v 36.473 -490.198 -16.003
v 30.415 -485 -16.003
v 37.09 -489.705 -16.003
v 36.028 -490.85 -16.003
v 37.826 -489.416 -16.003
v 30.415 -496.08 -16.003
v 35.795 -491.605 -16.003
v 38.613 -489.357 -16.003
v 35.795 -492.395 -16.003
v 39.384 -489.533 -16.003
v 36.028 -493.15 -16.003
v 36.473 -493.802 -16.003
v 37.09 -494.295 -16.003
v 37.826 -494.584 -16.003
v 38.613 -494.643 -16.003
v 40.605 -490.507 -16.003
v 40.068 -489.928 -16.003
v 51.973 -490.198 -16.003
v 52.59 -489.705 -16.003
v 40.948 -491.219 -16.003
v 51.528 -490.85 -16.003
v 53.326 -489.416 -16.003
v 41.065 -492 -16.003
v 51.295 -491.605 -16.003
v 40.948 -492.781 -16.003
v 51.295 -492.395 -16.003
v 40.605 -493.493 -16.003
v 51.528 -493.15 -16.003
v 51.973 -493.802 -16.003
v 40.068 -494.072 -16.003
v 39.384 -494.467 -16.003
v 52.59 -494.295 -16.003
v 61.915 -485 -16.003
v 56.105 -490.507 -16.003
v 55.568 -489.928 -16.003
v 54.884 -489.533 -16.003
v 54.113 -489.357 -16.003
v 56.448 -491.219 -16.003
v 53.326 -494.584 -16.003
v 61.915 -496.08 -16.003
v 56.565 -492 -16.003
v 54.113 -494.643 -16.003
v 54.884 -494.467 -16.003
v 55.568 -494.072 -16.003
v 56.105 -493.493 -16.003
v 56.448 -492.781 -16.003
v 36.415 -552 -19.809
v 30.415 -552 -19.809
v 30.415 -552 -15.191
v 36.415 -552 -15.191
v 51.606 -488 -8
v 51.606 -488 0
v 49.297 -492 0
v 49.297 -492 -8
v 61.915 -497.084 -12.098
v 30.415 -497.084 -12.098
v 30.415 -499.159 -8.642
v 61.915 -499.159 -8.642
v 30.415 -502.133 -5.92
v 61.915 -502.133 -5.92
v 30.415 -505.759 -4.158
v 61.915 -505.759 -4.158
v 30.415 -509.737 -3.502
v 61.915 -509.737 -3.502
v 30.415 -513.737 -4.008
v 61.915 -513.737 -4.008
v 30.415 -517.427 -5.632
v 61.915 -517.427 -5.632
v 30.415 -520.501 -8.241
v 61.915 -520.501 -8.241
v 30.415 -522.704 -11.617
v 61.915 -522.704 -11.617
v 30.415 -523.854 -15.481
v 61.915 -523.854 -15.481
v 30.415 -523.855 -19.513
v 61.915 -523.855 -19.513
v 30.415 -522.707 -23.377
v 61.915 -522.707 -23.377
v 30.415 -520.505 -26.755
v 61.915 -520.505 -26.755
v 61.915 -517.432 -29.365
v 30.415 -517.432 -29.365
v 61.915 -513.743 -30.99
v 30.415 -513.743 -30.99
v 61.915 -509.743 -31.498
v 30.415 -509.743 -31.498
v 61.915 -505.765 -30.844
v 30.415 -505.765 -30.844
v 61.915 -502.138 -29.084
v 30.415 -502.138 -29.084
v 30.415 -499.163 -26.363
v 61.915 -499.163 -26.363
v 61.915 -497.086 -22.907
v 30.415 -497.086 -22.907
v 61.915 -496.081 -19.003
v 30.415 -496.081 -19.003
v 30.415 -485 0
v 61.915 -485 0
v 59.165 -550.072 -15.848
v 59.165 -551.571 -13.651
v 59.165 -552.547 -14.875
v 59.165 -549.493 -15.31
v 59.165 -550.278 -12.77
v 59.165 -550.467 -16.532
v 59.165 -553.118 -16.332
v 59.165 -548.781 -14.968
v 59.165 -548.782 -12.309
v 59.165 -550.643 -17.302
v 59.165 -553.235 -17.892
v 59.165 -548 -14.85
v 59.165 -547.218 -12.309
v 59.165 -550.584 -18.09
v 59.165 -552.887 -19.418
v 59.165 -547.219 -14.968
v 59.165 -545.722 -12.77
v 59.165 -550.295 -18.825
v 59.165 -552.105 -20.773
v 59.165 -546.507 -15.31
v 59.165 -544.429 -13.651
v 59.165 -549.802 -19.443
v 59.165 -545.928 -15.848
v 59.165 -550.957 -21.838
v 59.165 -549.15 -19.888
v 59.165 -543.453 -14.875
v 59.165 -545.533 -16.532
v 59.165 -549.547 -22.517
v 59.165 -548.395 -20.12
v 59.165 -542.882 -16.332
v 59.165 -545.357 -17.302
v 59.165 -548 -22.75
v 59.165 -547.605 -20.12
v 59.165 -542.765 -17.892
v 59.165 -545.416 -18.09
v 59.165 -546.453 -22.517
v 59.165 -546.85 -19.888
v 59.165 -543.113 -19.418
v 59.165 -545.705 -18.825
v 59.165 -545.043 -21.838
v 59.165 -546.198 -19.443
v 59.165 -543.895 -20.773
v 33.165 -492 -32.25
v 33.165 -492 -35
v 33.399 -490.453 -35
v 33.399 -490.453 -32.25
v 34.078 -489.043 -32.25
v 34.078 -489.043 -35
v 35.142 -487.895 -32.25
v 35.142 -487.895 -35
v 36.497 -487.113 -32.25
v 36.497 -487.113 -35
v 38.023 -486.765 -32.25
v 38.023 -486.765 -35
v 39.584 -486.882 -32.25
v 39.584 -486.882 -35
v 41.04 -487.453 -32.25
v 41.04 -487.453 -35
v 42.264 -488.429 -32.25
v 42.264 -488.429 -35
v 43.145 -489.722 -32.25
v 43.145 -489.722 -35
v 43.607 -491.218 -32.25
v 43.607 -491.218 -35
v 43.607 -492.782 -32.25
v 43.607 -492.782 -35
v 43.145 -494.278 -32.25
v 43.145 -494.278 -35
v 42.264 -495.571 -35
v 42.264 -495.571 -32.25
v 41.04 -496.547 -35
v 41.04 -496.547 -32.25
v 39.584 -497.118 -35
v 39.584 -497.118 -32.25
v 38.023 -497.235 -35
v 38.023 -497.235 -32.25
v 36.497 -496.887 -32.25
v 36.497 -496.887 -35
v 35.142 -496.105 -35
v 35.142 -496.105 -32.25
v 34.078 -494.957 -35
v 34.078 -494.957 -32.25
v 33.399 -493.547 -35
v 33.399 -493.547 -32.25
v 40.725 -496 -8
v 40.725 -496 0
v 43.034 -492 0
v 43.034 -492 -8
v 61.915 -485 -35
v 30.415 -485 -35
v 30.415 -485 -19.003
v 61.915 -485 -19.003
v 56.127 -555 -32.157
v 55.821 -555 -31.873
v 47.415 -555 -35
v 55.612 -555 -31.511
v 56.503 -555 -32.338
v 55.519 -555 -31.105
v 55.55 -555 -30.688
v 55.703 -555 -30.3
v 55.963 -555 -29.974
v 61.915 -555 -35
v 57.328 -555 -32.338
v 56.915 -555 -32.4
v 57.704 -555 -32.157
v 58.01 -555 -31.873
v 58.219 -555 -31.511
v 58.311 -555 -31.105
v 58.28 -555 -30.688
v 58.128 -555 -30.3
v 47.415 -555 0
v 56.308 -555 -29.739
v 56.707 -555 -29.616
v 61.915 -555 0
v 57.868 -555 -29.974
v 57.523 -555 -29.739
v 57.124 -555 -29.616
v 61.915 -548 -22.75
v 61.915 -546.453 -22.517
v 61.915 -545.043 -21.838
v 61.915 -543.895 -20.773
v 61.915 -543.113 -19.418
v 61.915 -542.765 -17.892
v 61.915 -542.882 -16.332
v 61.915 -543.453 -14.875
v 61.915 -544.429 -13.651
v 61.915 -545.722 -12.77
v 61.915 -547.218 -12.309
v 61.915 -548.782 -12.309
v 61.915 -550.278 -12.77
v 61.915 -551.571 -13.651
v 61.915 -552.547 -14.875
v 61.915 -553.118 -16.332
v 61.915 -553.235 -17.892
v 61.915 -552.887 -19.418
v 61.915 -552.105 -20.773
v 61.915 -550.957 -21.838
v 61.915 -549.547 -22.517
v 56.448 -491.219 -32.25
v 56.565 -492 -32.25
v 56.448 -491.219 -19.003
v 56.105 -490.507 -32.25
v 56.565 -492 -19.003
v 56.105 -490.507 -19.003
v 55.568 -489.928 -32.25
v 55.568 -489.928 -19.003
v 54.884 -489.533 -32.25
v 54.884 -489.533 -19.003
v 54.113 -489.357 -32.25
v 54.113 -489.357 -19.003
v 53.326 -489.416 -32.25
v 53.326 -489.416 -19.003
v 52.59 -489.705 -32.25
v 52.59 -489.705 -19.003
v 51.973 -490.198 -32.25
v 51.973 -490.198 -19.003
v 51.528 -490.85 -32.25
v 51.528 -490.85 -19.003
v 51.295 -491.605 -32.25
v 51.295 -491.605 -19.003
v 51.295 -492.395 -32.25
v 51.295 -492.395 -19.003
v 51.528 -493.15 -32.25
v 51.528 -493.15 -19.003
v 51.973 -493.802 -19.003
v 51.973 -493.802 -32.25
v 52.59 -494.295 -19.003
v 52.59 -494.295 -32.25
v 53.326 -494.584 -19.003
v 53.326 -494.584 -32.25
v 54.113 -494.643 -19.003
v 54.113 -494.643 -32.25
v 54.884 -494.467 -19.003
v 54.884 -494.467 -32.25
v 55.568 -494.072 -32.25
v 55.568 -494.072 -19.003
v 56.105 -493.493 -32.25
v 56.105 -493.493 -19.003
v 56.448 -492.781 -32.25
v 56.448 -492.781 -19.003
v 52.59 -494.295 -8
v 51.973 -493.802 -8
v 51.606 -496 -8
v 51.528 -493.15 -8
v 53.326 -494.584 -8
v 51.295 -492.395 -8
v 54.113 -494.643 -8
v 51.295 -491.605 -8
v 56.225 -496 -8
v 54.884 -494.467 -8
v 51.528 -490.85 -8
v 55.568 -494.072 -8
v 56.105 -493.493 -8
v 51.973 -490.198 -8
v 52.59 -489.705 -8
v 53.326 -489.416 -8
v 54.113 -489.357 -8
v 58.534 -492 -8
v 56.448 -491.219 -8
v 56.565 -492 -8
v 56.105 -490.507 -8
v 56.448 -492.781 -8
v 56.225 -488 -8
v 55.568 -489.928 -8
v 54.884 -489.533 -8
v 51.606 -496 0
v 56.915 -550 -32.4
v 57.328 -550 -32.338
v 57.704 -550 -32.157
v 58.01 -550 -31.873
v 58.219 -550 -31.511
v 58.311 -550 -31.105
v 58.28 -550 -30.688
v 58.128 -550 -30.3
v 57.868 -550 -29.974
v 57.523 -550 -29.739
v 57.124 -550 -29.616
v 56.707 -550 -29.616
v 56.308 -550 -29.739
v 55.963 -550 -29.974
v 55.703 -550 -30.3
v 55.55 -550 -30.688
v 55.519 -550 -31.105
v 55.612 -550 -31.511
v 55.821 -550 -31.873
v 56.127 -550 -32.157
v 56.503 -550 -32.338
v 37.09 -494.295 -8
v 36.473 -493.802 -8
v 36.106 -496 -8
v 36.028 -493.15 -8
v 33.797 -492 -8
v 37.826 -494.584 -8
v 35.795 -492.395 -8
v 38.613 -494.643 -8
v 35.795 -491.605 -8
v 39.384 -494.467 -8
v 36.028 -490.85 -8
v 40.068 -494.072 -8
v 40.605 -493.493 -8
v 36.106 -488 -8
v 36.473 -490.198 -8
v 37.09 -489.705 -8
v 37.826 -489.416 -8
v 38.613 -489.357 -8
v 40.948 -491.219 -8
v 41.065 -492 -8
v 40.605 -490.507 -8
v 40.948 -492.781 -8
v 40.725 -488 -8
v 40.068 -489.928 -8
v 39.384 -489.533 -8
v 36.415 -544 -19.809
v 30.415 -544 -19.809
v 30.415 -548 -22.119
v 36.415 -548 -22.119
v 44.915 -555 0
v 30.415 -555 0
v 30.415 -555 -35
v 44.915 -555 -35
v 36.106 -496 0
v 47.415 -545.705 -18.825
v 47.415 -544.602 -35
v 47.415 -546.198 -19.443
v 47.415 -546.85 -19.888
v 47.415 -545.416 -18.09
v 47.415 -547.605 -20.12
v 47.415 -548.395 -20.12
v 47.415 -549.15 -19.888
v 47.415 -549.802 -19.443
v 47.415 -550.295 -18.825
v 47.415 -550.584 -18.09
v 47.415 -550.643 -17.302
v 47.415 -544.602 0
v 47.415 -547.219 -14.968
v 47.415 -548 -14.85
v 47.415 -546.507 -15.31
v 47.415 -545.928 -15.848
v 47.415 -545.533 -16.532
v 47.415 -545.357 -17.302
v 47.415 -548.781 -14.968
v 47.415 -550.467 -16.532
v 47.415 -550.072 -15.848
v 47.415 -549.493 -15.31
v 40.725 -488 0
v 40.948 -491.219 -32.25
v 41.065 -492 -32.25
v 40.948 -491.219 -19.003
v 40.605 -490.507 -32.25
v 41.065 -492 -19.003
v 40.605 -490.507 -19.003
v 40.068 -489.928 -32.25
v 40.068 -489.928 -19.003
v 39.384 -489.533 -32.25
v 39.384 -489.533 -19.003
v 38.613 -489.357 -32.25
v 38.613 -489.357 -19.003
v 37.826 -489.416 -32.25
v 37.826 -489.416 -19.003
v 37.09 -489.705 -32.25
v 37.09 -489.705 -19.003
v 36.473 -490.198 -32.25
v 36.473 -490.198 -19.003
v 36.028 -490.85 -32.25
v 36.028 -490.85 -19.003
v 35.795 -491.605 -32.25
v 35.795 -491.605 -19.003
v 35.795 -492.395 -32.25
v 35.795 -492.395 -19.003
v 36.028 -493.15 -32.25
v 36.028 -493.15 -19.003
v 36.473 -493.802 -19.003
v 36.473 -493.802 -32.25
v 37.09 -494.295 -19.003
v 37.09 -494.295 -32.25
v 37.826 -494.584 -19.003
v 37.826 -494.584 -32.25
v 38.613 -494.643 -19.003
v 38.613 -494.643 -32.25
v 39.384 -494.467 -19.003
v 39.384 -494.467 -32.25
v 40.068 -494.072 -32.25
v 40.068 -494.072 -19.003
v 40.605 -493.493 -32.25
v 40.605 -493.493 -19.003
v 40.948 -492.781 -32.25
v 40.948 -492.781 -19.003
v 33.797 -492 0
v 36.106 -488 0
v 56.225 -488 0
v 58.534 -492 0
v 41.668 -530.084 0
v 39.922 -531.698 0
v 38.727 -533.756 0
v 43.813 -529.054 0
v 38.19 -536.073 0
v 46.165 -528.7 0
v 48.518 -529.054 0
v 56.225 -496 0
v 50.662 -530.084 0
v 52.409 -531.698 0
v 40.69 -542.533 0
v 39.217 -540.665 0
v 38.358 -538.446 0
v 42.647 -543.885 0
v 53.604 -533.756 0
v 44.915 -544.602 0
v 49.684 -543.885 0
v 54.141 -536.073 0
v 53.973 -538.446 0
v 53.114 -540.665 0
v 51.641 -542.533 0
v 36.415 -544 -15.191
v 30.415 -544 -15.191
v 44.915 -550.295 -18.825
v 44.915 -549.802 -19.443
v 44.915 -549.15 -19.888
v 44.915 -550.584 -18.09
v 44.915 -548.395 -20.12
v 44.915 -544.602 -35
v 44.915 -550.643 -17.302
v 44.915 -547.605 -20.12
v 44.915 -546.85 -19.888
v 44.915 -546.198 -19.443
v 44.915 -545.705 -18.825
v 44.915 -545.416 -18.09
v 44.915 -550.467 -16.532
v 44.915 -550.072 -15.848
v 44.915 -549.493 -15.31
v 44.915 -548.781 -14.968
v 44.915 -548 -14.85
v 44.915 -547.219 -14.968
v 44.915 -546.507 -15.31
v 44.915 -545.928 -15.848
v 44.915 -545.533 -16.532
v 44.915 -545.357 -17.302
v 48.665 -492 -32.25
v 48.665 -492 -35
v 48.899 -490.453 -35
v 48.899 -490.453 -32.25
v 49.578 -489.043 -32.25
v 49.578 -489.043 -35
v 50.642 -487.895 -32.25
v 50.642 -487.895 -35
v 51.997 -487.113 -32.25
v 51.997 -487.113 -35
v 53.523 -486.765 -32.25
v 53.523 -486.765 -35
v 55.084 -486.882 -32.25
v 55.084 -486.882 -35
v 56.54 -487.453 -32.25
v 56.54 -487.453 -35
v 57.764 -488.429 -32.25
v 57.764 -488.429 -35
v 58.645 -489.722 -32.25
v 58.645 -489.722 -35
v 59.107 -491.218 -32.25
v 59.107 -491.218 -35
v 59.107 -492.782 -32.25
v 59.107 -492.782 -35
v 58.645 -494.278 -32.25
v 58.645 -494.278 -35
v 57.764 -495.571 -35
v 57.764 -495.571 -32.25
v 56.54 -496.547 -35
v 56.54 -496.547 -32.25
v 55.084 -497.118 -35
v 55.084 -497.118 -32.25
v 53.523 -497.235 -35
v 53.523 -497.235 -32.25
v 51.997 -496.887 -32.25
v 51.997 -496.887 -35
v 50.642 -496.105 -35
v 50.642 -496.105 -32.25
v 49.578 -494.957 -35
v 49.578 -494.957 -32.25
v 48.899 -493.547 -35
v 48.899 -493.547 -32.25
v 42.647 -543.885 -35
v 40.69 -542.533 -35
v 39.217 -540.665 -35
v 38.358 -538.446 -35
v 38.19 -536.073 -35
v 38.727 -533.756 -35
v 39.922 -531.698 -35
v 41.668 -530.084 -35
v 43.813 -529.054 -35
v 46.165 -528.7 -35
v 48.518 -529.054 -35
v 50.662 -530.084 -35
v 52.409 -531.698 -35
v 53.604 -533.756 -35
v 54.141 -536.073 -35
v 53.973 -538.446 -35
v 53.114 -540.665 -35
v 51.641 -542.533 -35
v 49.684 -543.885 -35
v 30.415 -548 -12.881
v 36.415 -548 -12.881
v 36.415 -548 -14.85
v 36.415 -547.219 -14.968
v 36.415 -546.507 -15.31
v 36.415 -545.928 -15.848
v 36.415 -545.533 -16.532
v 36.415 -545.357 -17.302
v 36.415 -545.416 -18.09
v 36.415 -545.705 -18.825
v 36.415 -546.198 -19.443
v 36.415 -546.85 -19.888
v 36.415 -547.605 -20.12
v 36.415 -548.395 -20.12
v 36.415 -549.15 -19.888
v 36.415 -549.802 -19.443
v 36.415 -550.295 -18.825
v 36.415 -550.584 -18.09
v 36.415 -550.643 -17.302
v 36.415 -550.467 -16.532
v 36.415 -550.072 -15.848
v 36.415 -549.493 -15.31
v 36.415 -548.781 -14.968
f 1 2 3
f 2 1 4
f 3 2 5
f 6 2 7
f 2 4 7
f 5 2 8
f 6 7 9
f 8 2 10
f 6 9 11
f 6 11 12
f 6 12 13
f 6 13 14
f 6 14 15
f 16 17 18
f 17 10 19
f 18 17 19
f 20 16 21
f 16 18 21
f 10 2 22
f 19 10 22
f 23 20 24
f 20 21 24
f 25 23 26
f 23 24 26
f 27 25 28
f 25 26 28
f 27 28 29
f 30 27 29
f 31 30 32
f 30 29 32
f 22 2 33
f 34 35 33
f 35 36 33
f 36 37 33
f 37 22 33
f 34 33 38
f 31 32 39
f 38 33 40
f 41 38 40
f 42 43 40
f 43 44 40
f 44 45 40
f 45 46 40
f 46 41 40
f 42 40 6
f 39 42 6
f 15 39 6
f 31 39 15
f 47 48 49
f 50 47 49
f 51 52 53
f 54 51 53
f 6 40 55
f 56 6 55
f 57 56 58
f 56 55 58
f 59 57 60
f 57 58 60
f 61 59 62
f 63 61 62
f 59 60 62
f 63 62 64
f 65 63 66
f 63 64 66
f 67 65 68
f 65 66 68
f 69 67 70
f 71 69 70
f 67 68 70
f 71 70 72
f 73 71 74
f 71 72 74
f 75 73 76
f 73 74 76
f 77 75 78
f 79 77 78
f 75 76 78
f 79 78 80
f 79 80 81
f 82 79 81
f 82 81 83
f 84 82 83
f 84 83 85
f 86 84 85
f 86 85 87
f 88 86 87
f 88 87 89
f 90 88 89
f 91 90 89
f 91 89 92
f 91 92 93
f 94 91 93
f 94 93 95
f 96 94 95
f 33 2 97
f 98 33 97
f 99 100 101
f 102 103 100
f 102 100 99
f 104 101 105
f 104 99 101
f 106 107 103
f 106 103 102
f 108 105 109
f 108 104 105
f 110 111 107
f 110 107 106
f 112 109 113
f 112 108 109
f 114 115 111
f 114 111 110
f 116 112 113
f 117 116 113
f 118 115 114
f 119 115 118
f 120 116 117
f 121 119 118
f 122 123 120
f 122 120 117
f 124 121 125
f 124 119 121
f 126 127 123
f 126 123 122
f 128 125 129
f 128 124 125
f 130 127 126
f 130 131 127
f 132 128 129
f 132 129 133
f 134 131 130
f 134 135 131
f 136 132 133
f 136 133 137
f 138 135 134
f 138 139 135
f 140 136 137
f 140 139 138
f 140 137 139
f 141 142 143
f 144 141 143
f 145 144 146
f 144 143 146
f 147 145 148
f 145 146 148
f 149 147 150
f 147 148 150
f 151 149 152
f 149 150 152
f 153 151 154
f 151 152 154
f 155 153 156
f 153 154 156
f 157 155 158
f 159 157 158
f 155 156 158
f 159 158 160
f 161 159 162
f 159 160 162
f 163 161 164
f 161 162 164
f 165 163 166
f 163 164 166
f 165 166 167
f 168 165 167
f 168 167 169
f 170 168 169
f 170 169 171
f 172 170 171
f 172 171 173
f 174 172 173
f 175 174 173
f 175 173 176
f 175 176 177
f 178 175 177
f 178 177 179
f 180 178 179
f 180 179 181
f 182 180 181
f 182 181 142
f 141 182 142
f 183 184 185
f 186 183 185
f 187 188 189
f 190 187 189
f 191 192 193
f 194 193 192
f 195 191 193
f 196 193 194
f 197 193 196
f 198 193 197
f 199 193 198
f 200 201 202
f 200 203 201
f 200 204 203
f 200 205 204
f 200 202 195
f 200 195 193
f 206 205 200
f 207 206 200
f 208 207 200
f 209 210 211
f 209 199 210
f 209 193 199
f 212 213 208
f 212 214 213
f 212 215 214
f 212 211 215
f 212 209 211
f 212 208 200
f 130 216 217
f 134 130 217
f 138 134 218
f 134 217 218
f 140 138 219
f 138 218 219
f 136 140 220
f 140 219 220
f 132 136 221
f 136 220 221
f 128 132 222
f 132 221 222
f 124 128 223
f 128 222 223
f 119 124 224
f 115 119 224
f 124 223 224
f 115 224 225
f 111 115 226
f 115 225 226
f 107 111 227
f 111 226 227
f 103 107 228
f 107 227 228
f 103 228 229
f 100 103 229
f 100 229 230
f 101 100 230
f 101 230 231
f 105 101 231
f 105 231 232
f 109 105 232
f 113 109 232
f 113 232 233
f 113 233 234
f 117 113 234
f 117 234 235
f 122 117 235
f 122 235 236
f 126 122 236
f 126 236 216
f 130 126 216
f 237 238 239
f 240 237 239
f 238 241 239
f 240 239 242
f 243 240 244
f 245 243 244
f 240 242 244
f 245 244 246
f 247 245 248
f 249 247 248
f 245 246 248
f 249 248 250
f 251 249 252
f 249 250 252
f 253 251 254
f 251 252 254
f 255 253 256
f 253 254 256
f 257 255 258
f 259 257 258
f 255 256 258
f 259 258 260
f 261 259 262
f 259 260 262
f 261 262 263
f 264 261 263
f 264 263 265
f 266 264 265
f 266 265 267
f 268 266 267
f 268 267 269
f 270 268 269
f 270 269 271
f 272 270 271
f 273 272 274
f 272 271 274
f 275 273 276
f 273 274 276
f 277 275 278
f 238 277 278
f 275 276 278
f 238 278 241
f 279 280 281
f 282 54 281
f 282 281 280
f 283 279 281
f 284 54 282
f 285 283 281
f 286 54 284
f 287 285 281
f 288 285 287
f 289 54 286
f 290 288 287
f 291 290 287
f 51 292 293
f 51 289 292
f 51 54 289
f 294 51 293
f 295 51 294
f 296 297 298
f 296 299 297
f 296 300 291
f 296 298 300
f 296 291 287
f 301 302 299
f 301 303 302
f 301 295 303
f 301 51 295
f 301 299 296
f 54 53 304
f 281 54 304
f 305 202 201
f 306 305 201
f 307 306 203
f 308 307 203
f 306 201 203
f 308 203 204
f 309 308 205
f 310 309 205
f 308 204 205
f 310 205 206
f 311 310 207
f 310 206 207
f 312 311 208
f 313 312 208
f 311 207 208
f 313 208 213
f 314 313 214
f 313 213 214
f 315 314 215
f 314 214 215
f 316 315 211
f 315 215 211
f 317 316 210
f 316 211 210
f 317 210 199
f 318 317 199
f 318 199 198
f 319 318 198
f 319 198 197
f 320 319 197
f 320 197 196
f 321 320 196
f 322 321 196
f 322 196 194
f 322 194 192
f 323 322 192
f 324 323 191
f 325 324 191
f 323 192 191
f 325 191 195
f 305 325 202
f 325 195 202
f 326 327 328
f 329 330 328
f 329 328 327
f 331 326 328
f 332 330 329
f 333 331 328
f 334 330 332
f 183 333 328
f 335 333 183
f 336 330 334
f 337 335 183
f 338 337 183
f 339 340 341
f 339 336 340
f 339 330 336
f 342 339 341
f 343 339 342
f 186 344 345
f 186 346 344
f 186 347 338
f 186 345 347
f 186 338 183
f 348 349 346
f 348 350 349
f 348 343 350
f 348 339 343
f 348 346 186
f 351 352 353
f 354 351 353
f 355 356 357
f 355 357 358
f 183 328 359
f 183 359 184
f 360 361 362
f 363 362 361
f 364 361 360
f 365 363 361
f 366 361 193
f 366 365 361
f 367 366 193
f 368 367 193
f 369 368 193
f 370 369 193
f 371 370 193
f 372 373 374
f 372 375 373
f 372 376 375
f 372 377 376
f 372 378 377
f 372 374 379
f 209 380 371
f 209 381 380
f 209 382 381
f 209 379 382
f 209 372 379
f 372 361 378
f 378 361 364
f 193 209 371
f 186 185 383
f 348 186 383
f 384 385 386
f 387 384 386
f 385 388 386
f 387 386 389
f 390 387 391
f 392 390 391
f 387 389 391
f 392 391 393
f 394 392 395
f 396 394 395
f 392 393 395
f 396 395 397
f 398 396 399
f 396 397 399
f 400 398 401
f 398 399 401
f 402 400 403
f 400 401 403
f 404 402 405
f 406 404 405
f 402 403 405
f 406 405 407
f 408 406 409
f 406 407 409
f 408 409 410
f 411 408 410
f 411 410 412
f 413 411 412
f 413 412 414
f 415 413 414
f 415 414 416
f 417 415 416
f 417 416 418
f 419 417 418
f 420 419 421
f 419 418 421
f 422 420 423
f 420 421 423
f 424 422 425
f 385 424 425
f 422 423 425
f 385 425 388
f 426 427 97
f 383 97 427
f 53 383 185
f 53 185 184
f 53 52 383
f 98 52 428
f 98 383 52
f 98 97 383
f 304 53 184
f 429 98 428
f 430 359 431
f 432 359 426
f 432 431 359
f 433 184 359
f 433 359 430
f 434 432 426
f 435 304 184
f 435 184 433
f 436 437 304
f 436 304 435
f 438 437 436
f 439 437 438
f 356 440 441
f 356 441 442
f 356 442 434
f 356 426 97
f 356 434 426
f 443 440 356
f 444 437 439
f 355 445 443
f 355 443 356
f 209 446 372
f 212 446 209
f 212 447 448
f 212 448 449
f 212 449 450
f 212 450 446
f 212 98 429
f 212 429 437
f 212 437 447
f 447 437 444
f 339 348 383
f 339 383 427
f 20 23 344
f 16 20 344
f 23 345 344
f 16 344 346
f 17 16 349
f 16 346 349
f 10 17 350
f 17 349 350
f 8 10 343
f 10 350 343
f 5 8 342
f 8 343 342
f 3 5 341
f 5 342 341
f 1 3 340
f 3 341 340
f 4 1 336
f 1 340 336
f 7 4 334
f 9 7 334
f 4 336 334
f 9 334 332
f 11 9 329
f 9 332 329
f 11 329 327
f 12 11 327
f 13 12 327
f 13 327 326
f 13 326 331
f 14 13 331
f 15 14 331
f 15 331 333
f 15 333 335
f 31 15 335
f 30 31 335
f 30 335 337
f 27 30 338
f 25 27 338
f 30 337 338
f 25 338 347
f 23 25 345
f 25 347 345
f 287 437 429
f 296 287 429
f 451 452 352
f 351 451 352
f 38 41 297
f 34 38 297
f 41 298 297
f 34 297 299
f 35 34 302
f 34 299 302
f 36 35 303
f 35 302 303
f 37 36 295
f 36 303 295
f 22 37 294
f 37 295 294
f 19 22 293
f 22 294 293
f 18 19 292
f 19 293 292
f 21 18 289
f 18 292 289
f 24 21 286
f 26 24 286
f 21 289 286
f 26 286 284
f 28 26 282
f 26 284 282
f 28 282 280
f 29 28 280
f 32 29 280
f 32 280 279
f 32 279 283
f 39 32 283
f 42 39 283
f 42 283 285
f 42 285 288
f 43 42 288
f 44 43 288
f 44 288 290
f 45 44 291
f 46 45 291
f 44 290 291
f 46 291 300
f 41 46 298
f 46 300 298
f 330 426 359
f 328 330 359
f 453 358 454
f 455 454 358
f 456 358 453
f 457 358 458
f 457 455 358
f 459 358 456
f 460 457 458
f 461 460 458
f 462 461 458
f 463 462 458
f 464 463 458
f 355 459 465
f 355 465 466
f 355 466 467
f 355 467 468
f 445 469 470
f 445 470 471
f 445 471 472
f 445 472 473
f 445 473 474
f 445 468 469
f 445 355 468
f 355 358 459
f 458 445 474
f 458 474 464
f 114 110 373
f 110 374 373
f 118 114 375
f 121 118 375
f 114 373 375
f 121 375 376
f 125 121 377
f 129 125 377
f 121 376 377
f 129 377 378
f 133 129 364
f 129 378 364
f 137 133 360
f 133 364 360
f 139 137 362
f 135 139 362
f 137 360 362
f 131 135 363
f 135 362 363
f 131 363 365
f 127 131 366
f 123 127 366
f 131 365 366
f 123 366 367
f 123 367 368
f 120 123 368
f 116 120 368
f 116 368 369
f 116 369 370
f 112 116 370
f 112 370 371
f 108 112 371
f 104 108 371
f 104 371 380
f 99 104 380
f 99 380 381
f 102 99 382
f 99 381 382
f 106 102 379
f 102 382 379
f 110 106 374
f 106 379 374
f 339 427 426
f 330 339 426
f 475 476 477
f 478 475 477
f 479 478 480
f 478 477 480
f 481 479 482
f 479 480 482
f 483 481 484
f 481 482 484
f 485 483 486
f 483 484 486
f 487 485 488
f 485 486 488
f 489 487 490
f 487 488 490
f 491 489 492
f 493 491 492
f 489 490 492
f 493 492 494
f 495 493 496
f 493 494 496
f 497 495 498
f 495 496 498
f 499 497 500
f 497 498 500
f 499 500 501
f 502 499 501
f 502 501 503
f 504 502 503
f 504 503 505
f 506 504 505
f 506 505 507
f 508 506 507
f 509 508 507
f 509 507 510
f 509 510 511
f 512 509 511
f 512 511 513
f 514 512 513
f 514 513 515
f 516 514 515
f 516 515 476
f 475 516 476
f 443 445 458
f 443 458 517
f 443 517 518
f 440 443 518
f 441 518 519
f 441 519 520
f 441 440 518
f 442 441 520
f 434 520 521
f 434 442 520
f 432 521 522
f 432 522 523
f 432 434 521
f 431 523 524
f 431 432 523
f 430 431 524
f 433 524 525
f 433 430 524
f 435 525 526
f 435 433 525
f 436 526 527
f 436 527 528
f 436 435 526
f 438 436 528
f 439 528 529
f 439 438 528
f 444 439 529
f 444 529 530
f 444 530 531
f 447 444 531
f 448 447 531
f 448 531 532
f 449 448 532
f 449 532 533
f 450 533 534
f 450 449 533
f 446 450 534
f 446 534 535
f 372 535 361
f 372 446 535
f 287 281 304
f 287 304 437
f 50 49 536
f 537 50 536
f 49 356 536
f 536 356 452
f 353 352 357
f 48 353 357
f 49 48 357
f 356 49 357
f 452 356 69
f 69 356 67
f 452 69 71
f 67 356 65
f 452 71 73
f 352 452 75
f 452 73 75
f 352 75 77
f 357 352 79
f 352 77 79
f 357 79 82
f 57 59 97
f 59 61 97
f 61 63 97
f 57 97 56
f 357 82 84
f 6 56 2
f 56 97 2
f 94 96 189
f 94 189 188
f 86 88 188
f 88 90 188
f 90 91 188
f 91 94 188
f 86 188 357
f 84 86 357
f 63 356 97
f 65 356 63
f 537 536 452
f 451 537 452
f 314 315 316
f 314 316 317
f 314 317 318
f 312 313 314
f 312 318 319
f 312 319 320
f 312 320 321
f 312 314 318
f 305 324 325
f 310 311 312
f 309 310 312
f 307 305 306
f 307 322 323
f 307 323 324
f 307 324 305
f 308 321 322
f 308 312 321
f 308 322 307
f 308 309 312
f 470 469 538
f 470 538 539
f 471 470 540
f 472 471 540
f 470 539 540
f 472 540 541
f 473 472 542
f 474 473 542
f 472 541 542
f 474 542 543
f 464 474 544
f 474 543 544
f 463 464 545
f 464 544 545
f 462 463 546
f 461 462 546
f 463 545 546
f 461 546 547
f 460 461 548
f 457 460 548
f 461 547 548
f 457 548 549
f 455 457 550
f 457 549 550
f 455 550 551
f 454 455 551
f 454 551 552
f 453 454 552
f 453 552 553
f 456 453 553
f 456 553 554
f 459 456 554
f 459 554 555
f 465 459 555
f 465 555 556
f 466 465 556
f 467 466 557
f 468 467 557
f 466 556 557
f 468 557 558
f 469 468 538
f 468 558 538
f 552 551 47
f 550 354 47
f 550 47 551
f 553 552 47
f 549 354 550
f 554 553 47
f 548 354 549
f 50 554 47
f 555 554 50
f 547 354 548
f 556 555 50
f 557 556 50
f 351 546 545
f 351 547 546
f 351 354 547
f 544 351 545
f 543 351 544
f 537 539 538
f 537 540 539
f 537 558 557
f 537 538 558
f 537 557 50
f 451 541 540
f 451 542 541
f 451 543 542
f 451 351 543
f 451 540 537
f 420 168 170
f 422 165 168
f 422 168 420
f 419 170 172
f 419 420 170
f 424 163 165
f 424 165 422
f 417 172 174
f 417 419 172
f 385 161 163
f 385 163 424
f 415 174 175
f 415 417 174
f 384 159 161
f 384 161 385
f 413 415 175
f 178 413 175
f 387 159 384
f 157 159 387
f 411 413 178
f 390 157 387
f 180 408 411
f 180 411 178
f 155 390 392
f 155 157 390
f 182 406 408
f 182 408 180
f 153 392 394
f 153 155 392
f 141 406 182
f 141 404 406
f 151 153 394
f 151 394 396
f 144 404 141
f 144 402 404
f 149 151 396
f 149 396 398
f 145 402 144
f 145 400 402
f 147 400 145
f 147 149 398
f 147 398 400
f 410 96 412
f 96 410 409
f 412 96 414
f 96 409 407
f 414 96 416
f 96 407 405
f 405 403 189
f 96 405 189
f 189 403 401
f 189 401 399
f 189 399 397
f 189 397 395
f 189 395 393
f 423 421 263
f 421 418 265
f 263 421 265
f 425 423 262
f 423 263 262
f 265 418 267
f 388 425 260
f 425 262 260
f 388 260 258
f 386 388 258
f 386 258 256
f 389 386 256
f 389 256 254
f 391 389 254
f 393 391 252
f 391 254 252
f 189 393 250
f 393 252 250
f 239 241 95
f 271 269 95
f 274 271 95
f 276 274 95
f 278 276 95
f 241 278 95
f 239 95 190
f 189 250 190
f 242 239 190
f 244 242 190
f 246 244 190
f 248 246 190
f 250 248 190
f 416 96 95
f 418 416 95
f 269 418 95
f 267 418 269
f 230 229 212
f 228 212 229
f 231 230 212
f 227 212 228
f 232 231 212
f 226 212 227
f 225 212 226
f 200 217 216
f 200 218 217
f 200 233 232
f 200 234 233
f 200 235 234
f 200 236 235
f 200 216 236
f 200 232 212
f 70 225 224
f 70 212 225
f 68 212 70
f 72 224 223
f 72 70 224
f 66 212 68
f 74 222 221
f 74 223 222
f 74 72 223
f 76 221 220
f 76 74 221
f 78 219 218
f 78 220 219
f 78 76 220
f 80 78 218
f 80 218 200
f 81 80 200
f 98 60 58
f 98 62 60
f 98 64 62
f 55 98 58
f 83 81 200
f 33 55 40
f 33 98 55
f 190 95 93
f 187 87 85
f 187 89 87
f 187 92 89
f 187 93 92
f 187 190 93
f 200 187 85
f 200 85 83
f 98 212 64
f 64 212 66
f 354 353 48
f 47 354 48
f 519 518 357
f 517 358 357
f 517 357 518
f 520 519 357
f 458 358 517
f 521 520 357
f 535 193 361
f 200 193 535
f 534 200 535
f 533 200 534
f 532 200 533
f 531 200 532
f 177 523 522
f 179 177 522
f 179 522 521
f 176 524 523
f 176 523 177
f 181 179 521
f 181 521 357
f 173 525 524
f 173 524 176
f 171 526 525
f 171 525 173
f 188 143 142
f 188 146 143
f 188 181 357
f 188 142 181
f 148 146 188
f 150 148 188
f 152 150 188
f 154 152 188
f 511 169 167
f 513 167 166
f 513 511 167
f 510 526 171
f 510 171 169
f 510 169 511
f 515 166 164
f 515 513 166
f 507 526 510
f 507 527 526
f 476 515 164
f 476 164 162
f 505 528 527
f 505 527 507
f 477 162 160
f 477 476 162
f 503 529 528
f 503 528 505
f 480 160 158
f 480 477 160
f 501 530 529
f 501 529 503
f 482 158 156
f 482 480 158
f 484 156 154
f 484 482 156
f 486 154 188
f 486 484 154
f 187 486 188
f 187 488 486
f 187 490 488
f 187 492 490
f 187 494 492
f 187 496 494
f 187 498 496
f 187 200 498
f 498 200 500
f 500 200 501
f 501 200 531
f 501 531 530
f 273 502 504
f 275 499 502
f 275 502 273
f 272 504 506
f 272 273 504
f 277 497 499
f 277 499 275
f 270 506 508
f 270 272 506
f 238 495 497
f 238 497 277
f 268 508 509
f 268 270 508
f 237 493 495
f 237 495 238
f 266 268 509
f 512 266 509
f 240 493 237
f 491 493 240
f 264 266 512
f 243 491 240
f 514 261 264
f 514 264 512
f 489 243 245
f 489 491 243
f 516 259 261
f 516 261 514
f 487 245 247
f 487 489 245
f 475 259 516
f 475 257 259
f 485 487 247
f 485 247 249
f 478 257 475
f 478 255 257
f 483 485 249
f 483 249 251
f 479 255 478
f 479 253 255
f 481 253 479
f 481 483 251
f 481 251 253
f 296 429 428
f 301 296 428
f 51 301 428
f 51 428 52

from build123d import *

# Parameters (mm, degrees)
BOSS_EXTRU_1_DEPTH                               = 35
BOSS_EXTRU_2_DEPTH                               = 31.5
CHAMBRAGE_POUR_VIS_T_TE_RONDE_6_PANS_D           = 5.3
CHAMBRAGE_POUR_VIS_T_TE_RONDE_6_PANS_DEPTH       = 44
CHAMBRAGE_POUR_VIS_T_TE_RONDE_6_PANS_CBORE_D     = 10.5
CHAMBRAGE_POUR_VIS_T_TE_RONDE_6_PANS_CBORE_DEPTH = 2.75
CHAMBRAGE_POUR_VIS_T_TE_RONDE_6_PANS_TIP         = 1.59228064
ENL_V_MAT_EXTRU_1_DEPTH                          = 8
ENL_V_MAT_EXTRU_2_DEPTH                          = 45
CHAMBRAGE_POUR_VIS_T_TE_RONDE_6_2_D              = 5.3
CHAMBRAGE_POUR_VIS_T_TE_RONDE_6_2_DEPTH          = 44
CHAMBRAGE_POUR_VIS_T_TE_RONDE_6_2_CBORE_D        = 10.5
CHAMBRAGE_POUR_VIS_T_TE_RONDE_6_2_CBORE_DEPTH    = 2.75
CHAMBRAGE_POUR_VIS_T_TE_RONDE_6_2_TIP            = 1.59228064
ENL_V_MAT_EXTRU_3_DEPTH                          = 6
ESQUISSE12_R                                     = 1.4
ENL_V_MAT_EXTRU_4_DEPTH                          = 5


with BuildPart() as part:
    # Esquisse1 → Boss.-Extru.1 (new body)
    with BuildSketch(Plane.XY):
        with BuildLine():
            Line((47.415392001, -544.601740315), (47.415392001, -555))
            Line((47.415392001, -555), (61.915392001, -555))
            Line((61.915392001, -555), (61.915392001, -505))
            Line((61.915392001, -505), (30.415392001, -505))
            Line((30.415392001, -505), (30.415392001, -555))
            Line((30.415392001, -555), (44.915392001, -555))
            Line((44.915392001, -555), (44.915392001, -544.601740315))
            ThreePointArc((44.915392001, -544.601740315), (46.165392001, -528.7), (47.415392001, -544.601740315))
        make_face()
    extrude(amount=-BOSS_EXTRU_1_DEPTH)

    # Esquisse4 → Boss.-Extru.2 (add)
    with BuildSketch(Plane(origin=(61.915392001, 0, 0), x_dir=(0, 0, -1), z_dir=(1, 0, 0))):
        Polygon((35, -505), (35, -485), (19.003014107, -485), (16.003014107, -485), (0, -485), (0, -505), align=None)
    extrude(amount=-BOSS_EXTRU_2_DEPTH)

    # Chambrage pour Vis _ t_te ronde _ 6 pans
    with Locations(Plane(origin=(0, 0, -35), x_dir=(-1, 0, 0), z_dir=(0, 0, -1))):
        with Locations((-53.915392001, -492), (-38.415392001, -492)):
            CounterBoreHole(CHAMBRAGE_POUR_VIS_T_TE_RONDE_6_PANS_D / 2, CHAMBRAGE_POUR_VIS_T_TE_RONDE_6_PANS_CBORE_D / 2, CHAMBRAGE_POUR_VIS_T_TE_RONDE_6_PANS_CBORE_DEPTH, depth=CHAMBRAGE_POUR_VIS_T_TE_RONDE_6_PANS_DEPTH)
            with Locations((0, 0, -(CHAMBRAGE_POUR_VIS_T_TE_RONDE_6_PANS_DEPTH + CHAMBRAGE_POUR_VIS_T_TE_RONDE_6_PANS_TIP / 2))):  # 118° drill point
                Cone(0, CHAMBRAGE_POUR_VIS_T_TE_RONDE_6_PANS_D / 2, CHAMBRAGE_POUR_VIS_T_TE_RONDE_6_PANS_TIP, mode=Mode.SUBTRACT)

    # Esquisse7 → Enlèv. mat.-Extru.1 (cut)
    with BuildSketch(Plane.XY):
        Polygon((56.224793078, -488), (51.605990924, -488), (49.296589847, -492), (51.605990924, -496), (56.224793078, -496), (58.534194154, -492), align=None)
        Polygon((40.724793078, -488), (36.105990924, -488), (33.796589847, -492), (36.105990924, -496), (40.724793078, -496), (43.034194154, -492), align=None)
    extrude(amount=-ENL_V_MAT_EXTRU_1_DEPTH, mode=Mode.SUBTRACT)

    # Esquisse8 → Enlèv. mat.-Extru.2 (cut)
    with BuildSketch(Plane(origin=(61.915392001, 0, 0), x_dir=(0, 0, -1), z_dir=(1, 0, 0))):
        with BuildLine():
            Line((16.003014107, -485), (16.003014107, -496.080264613))
            ThreePointArc((16.003014107, -496.080264613), (17.496968442, -523.999999672), (19.003014107, -496.080914233))
            Line((19.003014107, -496.080914233), (19.003014107, -485))
            Line((19.003014107, -485), (16.003014107, -485))
        make_face()
    extrude(amount=-ENL_V_MAT_EXTRU_2_DEPTH, mode=Mode.SUBTRACT)

    # Chambrage pour Vis _ t_te ronde _ 6  2
    with Locations(Plane(origin=(61.915392001, 0, 0), x_dir=(0, 0, -1), z_dir=(1, 0, 0))):
        with Locations((17.5, -548)):
            CounterBoreHole(CHAMBRAGE_POUR_VIS_T_TE_RONDE_6_2_D / 2, CHAMBRAGE_POUR_VIS_T_TE_RONDE_6_2_CBORE_D / 2, CHAMBRAGE_POUR_VIS_T_TE_RONDE_6_2_CBORE_DEPTH, depth=CHAMBRAGE_POUR_VIS_T_TE_RONDE_6_2_DEPTH)
            with Locations((0, 0, -(CHAMBRAGE_POUR_VIS_T_TE_RONDE_6_2_DEPTH + CHAMBRAGE_POUR_VIS_T_TE_RONDE_6_2_TIP / 2))):  # 118° drill point
                Cone(0, CHAMBRAGE_POUR_VIS_T_TE_RONDE_6_2_D / 2, CHAMBRAGE_POUR_VIS_T_TE_RONDE_6_2_TIP, mode=Mode.SUBTRACT)

    # Esquisse11 → Enlèv. mat.-Extru.3 (cut)
    with BuildSketch(Plane.ZY.offset(-30.415392001)):
        Polygon((-15.190598923, -544), (-19.809401077, -544), (-22.118802154, -548), (-19.809401077, -552), (-15.190598923, -552), (-12.881197846, -548), align=None)
    extrude(amount=-ENL_V_MAT_EXTRU_3_DEPTH, mode=Mode.SUBTRACT)

    # Esquisse12 → Enlèv. mat.-Extru.4 (cut)
    with BuildSketch(Plane.XZ.offset(555)):
        with Locations(Location((56.915392001, -31, 0), (0, 0, 270))):
            Circle(ESQUISSE12_R)
    extrude(amount=-ENL_V_MAT_EXTRU_4_DEPTH, mode=Mode.SUBTRACT)


solid = part.part
